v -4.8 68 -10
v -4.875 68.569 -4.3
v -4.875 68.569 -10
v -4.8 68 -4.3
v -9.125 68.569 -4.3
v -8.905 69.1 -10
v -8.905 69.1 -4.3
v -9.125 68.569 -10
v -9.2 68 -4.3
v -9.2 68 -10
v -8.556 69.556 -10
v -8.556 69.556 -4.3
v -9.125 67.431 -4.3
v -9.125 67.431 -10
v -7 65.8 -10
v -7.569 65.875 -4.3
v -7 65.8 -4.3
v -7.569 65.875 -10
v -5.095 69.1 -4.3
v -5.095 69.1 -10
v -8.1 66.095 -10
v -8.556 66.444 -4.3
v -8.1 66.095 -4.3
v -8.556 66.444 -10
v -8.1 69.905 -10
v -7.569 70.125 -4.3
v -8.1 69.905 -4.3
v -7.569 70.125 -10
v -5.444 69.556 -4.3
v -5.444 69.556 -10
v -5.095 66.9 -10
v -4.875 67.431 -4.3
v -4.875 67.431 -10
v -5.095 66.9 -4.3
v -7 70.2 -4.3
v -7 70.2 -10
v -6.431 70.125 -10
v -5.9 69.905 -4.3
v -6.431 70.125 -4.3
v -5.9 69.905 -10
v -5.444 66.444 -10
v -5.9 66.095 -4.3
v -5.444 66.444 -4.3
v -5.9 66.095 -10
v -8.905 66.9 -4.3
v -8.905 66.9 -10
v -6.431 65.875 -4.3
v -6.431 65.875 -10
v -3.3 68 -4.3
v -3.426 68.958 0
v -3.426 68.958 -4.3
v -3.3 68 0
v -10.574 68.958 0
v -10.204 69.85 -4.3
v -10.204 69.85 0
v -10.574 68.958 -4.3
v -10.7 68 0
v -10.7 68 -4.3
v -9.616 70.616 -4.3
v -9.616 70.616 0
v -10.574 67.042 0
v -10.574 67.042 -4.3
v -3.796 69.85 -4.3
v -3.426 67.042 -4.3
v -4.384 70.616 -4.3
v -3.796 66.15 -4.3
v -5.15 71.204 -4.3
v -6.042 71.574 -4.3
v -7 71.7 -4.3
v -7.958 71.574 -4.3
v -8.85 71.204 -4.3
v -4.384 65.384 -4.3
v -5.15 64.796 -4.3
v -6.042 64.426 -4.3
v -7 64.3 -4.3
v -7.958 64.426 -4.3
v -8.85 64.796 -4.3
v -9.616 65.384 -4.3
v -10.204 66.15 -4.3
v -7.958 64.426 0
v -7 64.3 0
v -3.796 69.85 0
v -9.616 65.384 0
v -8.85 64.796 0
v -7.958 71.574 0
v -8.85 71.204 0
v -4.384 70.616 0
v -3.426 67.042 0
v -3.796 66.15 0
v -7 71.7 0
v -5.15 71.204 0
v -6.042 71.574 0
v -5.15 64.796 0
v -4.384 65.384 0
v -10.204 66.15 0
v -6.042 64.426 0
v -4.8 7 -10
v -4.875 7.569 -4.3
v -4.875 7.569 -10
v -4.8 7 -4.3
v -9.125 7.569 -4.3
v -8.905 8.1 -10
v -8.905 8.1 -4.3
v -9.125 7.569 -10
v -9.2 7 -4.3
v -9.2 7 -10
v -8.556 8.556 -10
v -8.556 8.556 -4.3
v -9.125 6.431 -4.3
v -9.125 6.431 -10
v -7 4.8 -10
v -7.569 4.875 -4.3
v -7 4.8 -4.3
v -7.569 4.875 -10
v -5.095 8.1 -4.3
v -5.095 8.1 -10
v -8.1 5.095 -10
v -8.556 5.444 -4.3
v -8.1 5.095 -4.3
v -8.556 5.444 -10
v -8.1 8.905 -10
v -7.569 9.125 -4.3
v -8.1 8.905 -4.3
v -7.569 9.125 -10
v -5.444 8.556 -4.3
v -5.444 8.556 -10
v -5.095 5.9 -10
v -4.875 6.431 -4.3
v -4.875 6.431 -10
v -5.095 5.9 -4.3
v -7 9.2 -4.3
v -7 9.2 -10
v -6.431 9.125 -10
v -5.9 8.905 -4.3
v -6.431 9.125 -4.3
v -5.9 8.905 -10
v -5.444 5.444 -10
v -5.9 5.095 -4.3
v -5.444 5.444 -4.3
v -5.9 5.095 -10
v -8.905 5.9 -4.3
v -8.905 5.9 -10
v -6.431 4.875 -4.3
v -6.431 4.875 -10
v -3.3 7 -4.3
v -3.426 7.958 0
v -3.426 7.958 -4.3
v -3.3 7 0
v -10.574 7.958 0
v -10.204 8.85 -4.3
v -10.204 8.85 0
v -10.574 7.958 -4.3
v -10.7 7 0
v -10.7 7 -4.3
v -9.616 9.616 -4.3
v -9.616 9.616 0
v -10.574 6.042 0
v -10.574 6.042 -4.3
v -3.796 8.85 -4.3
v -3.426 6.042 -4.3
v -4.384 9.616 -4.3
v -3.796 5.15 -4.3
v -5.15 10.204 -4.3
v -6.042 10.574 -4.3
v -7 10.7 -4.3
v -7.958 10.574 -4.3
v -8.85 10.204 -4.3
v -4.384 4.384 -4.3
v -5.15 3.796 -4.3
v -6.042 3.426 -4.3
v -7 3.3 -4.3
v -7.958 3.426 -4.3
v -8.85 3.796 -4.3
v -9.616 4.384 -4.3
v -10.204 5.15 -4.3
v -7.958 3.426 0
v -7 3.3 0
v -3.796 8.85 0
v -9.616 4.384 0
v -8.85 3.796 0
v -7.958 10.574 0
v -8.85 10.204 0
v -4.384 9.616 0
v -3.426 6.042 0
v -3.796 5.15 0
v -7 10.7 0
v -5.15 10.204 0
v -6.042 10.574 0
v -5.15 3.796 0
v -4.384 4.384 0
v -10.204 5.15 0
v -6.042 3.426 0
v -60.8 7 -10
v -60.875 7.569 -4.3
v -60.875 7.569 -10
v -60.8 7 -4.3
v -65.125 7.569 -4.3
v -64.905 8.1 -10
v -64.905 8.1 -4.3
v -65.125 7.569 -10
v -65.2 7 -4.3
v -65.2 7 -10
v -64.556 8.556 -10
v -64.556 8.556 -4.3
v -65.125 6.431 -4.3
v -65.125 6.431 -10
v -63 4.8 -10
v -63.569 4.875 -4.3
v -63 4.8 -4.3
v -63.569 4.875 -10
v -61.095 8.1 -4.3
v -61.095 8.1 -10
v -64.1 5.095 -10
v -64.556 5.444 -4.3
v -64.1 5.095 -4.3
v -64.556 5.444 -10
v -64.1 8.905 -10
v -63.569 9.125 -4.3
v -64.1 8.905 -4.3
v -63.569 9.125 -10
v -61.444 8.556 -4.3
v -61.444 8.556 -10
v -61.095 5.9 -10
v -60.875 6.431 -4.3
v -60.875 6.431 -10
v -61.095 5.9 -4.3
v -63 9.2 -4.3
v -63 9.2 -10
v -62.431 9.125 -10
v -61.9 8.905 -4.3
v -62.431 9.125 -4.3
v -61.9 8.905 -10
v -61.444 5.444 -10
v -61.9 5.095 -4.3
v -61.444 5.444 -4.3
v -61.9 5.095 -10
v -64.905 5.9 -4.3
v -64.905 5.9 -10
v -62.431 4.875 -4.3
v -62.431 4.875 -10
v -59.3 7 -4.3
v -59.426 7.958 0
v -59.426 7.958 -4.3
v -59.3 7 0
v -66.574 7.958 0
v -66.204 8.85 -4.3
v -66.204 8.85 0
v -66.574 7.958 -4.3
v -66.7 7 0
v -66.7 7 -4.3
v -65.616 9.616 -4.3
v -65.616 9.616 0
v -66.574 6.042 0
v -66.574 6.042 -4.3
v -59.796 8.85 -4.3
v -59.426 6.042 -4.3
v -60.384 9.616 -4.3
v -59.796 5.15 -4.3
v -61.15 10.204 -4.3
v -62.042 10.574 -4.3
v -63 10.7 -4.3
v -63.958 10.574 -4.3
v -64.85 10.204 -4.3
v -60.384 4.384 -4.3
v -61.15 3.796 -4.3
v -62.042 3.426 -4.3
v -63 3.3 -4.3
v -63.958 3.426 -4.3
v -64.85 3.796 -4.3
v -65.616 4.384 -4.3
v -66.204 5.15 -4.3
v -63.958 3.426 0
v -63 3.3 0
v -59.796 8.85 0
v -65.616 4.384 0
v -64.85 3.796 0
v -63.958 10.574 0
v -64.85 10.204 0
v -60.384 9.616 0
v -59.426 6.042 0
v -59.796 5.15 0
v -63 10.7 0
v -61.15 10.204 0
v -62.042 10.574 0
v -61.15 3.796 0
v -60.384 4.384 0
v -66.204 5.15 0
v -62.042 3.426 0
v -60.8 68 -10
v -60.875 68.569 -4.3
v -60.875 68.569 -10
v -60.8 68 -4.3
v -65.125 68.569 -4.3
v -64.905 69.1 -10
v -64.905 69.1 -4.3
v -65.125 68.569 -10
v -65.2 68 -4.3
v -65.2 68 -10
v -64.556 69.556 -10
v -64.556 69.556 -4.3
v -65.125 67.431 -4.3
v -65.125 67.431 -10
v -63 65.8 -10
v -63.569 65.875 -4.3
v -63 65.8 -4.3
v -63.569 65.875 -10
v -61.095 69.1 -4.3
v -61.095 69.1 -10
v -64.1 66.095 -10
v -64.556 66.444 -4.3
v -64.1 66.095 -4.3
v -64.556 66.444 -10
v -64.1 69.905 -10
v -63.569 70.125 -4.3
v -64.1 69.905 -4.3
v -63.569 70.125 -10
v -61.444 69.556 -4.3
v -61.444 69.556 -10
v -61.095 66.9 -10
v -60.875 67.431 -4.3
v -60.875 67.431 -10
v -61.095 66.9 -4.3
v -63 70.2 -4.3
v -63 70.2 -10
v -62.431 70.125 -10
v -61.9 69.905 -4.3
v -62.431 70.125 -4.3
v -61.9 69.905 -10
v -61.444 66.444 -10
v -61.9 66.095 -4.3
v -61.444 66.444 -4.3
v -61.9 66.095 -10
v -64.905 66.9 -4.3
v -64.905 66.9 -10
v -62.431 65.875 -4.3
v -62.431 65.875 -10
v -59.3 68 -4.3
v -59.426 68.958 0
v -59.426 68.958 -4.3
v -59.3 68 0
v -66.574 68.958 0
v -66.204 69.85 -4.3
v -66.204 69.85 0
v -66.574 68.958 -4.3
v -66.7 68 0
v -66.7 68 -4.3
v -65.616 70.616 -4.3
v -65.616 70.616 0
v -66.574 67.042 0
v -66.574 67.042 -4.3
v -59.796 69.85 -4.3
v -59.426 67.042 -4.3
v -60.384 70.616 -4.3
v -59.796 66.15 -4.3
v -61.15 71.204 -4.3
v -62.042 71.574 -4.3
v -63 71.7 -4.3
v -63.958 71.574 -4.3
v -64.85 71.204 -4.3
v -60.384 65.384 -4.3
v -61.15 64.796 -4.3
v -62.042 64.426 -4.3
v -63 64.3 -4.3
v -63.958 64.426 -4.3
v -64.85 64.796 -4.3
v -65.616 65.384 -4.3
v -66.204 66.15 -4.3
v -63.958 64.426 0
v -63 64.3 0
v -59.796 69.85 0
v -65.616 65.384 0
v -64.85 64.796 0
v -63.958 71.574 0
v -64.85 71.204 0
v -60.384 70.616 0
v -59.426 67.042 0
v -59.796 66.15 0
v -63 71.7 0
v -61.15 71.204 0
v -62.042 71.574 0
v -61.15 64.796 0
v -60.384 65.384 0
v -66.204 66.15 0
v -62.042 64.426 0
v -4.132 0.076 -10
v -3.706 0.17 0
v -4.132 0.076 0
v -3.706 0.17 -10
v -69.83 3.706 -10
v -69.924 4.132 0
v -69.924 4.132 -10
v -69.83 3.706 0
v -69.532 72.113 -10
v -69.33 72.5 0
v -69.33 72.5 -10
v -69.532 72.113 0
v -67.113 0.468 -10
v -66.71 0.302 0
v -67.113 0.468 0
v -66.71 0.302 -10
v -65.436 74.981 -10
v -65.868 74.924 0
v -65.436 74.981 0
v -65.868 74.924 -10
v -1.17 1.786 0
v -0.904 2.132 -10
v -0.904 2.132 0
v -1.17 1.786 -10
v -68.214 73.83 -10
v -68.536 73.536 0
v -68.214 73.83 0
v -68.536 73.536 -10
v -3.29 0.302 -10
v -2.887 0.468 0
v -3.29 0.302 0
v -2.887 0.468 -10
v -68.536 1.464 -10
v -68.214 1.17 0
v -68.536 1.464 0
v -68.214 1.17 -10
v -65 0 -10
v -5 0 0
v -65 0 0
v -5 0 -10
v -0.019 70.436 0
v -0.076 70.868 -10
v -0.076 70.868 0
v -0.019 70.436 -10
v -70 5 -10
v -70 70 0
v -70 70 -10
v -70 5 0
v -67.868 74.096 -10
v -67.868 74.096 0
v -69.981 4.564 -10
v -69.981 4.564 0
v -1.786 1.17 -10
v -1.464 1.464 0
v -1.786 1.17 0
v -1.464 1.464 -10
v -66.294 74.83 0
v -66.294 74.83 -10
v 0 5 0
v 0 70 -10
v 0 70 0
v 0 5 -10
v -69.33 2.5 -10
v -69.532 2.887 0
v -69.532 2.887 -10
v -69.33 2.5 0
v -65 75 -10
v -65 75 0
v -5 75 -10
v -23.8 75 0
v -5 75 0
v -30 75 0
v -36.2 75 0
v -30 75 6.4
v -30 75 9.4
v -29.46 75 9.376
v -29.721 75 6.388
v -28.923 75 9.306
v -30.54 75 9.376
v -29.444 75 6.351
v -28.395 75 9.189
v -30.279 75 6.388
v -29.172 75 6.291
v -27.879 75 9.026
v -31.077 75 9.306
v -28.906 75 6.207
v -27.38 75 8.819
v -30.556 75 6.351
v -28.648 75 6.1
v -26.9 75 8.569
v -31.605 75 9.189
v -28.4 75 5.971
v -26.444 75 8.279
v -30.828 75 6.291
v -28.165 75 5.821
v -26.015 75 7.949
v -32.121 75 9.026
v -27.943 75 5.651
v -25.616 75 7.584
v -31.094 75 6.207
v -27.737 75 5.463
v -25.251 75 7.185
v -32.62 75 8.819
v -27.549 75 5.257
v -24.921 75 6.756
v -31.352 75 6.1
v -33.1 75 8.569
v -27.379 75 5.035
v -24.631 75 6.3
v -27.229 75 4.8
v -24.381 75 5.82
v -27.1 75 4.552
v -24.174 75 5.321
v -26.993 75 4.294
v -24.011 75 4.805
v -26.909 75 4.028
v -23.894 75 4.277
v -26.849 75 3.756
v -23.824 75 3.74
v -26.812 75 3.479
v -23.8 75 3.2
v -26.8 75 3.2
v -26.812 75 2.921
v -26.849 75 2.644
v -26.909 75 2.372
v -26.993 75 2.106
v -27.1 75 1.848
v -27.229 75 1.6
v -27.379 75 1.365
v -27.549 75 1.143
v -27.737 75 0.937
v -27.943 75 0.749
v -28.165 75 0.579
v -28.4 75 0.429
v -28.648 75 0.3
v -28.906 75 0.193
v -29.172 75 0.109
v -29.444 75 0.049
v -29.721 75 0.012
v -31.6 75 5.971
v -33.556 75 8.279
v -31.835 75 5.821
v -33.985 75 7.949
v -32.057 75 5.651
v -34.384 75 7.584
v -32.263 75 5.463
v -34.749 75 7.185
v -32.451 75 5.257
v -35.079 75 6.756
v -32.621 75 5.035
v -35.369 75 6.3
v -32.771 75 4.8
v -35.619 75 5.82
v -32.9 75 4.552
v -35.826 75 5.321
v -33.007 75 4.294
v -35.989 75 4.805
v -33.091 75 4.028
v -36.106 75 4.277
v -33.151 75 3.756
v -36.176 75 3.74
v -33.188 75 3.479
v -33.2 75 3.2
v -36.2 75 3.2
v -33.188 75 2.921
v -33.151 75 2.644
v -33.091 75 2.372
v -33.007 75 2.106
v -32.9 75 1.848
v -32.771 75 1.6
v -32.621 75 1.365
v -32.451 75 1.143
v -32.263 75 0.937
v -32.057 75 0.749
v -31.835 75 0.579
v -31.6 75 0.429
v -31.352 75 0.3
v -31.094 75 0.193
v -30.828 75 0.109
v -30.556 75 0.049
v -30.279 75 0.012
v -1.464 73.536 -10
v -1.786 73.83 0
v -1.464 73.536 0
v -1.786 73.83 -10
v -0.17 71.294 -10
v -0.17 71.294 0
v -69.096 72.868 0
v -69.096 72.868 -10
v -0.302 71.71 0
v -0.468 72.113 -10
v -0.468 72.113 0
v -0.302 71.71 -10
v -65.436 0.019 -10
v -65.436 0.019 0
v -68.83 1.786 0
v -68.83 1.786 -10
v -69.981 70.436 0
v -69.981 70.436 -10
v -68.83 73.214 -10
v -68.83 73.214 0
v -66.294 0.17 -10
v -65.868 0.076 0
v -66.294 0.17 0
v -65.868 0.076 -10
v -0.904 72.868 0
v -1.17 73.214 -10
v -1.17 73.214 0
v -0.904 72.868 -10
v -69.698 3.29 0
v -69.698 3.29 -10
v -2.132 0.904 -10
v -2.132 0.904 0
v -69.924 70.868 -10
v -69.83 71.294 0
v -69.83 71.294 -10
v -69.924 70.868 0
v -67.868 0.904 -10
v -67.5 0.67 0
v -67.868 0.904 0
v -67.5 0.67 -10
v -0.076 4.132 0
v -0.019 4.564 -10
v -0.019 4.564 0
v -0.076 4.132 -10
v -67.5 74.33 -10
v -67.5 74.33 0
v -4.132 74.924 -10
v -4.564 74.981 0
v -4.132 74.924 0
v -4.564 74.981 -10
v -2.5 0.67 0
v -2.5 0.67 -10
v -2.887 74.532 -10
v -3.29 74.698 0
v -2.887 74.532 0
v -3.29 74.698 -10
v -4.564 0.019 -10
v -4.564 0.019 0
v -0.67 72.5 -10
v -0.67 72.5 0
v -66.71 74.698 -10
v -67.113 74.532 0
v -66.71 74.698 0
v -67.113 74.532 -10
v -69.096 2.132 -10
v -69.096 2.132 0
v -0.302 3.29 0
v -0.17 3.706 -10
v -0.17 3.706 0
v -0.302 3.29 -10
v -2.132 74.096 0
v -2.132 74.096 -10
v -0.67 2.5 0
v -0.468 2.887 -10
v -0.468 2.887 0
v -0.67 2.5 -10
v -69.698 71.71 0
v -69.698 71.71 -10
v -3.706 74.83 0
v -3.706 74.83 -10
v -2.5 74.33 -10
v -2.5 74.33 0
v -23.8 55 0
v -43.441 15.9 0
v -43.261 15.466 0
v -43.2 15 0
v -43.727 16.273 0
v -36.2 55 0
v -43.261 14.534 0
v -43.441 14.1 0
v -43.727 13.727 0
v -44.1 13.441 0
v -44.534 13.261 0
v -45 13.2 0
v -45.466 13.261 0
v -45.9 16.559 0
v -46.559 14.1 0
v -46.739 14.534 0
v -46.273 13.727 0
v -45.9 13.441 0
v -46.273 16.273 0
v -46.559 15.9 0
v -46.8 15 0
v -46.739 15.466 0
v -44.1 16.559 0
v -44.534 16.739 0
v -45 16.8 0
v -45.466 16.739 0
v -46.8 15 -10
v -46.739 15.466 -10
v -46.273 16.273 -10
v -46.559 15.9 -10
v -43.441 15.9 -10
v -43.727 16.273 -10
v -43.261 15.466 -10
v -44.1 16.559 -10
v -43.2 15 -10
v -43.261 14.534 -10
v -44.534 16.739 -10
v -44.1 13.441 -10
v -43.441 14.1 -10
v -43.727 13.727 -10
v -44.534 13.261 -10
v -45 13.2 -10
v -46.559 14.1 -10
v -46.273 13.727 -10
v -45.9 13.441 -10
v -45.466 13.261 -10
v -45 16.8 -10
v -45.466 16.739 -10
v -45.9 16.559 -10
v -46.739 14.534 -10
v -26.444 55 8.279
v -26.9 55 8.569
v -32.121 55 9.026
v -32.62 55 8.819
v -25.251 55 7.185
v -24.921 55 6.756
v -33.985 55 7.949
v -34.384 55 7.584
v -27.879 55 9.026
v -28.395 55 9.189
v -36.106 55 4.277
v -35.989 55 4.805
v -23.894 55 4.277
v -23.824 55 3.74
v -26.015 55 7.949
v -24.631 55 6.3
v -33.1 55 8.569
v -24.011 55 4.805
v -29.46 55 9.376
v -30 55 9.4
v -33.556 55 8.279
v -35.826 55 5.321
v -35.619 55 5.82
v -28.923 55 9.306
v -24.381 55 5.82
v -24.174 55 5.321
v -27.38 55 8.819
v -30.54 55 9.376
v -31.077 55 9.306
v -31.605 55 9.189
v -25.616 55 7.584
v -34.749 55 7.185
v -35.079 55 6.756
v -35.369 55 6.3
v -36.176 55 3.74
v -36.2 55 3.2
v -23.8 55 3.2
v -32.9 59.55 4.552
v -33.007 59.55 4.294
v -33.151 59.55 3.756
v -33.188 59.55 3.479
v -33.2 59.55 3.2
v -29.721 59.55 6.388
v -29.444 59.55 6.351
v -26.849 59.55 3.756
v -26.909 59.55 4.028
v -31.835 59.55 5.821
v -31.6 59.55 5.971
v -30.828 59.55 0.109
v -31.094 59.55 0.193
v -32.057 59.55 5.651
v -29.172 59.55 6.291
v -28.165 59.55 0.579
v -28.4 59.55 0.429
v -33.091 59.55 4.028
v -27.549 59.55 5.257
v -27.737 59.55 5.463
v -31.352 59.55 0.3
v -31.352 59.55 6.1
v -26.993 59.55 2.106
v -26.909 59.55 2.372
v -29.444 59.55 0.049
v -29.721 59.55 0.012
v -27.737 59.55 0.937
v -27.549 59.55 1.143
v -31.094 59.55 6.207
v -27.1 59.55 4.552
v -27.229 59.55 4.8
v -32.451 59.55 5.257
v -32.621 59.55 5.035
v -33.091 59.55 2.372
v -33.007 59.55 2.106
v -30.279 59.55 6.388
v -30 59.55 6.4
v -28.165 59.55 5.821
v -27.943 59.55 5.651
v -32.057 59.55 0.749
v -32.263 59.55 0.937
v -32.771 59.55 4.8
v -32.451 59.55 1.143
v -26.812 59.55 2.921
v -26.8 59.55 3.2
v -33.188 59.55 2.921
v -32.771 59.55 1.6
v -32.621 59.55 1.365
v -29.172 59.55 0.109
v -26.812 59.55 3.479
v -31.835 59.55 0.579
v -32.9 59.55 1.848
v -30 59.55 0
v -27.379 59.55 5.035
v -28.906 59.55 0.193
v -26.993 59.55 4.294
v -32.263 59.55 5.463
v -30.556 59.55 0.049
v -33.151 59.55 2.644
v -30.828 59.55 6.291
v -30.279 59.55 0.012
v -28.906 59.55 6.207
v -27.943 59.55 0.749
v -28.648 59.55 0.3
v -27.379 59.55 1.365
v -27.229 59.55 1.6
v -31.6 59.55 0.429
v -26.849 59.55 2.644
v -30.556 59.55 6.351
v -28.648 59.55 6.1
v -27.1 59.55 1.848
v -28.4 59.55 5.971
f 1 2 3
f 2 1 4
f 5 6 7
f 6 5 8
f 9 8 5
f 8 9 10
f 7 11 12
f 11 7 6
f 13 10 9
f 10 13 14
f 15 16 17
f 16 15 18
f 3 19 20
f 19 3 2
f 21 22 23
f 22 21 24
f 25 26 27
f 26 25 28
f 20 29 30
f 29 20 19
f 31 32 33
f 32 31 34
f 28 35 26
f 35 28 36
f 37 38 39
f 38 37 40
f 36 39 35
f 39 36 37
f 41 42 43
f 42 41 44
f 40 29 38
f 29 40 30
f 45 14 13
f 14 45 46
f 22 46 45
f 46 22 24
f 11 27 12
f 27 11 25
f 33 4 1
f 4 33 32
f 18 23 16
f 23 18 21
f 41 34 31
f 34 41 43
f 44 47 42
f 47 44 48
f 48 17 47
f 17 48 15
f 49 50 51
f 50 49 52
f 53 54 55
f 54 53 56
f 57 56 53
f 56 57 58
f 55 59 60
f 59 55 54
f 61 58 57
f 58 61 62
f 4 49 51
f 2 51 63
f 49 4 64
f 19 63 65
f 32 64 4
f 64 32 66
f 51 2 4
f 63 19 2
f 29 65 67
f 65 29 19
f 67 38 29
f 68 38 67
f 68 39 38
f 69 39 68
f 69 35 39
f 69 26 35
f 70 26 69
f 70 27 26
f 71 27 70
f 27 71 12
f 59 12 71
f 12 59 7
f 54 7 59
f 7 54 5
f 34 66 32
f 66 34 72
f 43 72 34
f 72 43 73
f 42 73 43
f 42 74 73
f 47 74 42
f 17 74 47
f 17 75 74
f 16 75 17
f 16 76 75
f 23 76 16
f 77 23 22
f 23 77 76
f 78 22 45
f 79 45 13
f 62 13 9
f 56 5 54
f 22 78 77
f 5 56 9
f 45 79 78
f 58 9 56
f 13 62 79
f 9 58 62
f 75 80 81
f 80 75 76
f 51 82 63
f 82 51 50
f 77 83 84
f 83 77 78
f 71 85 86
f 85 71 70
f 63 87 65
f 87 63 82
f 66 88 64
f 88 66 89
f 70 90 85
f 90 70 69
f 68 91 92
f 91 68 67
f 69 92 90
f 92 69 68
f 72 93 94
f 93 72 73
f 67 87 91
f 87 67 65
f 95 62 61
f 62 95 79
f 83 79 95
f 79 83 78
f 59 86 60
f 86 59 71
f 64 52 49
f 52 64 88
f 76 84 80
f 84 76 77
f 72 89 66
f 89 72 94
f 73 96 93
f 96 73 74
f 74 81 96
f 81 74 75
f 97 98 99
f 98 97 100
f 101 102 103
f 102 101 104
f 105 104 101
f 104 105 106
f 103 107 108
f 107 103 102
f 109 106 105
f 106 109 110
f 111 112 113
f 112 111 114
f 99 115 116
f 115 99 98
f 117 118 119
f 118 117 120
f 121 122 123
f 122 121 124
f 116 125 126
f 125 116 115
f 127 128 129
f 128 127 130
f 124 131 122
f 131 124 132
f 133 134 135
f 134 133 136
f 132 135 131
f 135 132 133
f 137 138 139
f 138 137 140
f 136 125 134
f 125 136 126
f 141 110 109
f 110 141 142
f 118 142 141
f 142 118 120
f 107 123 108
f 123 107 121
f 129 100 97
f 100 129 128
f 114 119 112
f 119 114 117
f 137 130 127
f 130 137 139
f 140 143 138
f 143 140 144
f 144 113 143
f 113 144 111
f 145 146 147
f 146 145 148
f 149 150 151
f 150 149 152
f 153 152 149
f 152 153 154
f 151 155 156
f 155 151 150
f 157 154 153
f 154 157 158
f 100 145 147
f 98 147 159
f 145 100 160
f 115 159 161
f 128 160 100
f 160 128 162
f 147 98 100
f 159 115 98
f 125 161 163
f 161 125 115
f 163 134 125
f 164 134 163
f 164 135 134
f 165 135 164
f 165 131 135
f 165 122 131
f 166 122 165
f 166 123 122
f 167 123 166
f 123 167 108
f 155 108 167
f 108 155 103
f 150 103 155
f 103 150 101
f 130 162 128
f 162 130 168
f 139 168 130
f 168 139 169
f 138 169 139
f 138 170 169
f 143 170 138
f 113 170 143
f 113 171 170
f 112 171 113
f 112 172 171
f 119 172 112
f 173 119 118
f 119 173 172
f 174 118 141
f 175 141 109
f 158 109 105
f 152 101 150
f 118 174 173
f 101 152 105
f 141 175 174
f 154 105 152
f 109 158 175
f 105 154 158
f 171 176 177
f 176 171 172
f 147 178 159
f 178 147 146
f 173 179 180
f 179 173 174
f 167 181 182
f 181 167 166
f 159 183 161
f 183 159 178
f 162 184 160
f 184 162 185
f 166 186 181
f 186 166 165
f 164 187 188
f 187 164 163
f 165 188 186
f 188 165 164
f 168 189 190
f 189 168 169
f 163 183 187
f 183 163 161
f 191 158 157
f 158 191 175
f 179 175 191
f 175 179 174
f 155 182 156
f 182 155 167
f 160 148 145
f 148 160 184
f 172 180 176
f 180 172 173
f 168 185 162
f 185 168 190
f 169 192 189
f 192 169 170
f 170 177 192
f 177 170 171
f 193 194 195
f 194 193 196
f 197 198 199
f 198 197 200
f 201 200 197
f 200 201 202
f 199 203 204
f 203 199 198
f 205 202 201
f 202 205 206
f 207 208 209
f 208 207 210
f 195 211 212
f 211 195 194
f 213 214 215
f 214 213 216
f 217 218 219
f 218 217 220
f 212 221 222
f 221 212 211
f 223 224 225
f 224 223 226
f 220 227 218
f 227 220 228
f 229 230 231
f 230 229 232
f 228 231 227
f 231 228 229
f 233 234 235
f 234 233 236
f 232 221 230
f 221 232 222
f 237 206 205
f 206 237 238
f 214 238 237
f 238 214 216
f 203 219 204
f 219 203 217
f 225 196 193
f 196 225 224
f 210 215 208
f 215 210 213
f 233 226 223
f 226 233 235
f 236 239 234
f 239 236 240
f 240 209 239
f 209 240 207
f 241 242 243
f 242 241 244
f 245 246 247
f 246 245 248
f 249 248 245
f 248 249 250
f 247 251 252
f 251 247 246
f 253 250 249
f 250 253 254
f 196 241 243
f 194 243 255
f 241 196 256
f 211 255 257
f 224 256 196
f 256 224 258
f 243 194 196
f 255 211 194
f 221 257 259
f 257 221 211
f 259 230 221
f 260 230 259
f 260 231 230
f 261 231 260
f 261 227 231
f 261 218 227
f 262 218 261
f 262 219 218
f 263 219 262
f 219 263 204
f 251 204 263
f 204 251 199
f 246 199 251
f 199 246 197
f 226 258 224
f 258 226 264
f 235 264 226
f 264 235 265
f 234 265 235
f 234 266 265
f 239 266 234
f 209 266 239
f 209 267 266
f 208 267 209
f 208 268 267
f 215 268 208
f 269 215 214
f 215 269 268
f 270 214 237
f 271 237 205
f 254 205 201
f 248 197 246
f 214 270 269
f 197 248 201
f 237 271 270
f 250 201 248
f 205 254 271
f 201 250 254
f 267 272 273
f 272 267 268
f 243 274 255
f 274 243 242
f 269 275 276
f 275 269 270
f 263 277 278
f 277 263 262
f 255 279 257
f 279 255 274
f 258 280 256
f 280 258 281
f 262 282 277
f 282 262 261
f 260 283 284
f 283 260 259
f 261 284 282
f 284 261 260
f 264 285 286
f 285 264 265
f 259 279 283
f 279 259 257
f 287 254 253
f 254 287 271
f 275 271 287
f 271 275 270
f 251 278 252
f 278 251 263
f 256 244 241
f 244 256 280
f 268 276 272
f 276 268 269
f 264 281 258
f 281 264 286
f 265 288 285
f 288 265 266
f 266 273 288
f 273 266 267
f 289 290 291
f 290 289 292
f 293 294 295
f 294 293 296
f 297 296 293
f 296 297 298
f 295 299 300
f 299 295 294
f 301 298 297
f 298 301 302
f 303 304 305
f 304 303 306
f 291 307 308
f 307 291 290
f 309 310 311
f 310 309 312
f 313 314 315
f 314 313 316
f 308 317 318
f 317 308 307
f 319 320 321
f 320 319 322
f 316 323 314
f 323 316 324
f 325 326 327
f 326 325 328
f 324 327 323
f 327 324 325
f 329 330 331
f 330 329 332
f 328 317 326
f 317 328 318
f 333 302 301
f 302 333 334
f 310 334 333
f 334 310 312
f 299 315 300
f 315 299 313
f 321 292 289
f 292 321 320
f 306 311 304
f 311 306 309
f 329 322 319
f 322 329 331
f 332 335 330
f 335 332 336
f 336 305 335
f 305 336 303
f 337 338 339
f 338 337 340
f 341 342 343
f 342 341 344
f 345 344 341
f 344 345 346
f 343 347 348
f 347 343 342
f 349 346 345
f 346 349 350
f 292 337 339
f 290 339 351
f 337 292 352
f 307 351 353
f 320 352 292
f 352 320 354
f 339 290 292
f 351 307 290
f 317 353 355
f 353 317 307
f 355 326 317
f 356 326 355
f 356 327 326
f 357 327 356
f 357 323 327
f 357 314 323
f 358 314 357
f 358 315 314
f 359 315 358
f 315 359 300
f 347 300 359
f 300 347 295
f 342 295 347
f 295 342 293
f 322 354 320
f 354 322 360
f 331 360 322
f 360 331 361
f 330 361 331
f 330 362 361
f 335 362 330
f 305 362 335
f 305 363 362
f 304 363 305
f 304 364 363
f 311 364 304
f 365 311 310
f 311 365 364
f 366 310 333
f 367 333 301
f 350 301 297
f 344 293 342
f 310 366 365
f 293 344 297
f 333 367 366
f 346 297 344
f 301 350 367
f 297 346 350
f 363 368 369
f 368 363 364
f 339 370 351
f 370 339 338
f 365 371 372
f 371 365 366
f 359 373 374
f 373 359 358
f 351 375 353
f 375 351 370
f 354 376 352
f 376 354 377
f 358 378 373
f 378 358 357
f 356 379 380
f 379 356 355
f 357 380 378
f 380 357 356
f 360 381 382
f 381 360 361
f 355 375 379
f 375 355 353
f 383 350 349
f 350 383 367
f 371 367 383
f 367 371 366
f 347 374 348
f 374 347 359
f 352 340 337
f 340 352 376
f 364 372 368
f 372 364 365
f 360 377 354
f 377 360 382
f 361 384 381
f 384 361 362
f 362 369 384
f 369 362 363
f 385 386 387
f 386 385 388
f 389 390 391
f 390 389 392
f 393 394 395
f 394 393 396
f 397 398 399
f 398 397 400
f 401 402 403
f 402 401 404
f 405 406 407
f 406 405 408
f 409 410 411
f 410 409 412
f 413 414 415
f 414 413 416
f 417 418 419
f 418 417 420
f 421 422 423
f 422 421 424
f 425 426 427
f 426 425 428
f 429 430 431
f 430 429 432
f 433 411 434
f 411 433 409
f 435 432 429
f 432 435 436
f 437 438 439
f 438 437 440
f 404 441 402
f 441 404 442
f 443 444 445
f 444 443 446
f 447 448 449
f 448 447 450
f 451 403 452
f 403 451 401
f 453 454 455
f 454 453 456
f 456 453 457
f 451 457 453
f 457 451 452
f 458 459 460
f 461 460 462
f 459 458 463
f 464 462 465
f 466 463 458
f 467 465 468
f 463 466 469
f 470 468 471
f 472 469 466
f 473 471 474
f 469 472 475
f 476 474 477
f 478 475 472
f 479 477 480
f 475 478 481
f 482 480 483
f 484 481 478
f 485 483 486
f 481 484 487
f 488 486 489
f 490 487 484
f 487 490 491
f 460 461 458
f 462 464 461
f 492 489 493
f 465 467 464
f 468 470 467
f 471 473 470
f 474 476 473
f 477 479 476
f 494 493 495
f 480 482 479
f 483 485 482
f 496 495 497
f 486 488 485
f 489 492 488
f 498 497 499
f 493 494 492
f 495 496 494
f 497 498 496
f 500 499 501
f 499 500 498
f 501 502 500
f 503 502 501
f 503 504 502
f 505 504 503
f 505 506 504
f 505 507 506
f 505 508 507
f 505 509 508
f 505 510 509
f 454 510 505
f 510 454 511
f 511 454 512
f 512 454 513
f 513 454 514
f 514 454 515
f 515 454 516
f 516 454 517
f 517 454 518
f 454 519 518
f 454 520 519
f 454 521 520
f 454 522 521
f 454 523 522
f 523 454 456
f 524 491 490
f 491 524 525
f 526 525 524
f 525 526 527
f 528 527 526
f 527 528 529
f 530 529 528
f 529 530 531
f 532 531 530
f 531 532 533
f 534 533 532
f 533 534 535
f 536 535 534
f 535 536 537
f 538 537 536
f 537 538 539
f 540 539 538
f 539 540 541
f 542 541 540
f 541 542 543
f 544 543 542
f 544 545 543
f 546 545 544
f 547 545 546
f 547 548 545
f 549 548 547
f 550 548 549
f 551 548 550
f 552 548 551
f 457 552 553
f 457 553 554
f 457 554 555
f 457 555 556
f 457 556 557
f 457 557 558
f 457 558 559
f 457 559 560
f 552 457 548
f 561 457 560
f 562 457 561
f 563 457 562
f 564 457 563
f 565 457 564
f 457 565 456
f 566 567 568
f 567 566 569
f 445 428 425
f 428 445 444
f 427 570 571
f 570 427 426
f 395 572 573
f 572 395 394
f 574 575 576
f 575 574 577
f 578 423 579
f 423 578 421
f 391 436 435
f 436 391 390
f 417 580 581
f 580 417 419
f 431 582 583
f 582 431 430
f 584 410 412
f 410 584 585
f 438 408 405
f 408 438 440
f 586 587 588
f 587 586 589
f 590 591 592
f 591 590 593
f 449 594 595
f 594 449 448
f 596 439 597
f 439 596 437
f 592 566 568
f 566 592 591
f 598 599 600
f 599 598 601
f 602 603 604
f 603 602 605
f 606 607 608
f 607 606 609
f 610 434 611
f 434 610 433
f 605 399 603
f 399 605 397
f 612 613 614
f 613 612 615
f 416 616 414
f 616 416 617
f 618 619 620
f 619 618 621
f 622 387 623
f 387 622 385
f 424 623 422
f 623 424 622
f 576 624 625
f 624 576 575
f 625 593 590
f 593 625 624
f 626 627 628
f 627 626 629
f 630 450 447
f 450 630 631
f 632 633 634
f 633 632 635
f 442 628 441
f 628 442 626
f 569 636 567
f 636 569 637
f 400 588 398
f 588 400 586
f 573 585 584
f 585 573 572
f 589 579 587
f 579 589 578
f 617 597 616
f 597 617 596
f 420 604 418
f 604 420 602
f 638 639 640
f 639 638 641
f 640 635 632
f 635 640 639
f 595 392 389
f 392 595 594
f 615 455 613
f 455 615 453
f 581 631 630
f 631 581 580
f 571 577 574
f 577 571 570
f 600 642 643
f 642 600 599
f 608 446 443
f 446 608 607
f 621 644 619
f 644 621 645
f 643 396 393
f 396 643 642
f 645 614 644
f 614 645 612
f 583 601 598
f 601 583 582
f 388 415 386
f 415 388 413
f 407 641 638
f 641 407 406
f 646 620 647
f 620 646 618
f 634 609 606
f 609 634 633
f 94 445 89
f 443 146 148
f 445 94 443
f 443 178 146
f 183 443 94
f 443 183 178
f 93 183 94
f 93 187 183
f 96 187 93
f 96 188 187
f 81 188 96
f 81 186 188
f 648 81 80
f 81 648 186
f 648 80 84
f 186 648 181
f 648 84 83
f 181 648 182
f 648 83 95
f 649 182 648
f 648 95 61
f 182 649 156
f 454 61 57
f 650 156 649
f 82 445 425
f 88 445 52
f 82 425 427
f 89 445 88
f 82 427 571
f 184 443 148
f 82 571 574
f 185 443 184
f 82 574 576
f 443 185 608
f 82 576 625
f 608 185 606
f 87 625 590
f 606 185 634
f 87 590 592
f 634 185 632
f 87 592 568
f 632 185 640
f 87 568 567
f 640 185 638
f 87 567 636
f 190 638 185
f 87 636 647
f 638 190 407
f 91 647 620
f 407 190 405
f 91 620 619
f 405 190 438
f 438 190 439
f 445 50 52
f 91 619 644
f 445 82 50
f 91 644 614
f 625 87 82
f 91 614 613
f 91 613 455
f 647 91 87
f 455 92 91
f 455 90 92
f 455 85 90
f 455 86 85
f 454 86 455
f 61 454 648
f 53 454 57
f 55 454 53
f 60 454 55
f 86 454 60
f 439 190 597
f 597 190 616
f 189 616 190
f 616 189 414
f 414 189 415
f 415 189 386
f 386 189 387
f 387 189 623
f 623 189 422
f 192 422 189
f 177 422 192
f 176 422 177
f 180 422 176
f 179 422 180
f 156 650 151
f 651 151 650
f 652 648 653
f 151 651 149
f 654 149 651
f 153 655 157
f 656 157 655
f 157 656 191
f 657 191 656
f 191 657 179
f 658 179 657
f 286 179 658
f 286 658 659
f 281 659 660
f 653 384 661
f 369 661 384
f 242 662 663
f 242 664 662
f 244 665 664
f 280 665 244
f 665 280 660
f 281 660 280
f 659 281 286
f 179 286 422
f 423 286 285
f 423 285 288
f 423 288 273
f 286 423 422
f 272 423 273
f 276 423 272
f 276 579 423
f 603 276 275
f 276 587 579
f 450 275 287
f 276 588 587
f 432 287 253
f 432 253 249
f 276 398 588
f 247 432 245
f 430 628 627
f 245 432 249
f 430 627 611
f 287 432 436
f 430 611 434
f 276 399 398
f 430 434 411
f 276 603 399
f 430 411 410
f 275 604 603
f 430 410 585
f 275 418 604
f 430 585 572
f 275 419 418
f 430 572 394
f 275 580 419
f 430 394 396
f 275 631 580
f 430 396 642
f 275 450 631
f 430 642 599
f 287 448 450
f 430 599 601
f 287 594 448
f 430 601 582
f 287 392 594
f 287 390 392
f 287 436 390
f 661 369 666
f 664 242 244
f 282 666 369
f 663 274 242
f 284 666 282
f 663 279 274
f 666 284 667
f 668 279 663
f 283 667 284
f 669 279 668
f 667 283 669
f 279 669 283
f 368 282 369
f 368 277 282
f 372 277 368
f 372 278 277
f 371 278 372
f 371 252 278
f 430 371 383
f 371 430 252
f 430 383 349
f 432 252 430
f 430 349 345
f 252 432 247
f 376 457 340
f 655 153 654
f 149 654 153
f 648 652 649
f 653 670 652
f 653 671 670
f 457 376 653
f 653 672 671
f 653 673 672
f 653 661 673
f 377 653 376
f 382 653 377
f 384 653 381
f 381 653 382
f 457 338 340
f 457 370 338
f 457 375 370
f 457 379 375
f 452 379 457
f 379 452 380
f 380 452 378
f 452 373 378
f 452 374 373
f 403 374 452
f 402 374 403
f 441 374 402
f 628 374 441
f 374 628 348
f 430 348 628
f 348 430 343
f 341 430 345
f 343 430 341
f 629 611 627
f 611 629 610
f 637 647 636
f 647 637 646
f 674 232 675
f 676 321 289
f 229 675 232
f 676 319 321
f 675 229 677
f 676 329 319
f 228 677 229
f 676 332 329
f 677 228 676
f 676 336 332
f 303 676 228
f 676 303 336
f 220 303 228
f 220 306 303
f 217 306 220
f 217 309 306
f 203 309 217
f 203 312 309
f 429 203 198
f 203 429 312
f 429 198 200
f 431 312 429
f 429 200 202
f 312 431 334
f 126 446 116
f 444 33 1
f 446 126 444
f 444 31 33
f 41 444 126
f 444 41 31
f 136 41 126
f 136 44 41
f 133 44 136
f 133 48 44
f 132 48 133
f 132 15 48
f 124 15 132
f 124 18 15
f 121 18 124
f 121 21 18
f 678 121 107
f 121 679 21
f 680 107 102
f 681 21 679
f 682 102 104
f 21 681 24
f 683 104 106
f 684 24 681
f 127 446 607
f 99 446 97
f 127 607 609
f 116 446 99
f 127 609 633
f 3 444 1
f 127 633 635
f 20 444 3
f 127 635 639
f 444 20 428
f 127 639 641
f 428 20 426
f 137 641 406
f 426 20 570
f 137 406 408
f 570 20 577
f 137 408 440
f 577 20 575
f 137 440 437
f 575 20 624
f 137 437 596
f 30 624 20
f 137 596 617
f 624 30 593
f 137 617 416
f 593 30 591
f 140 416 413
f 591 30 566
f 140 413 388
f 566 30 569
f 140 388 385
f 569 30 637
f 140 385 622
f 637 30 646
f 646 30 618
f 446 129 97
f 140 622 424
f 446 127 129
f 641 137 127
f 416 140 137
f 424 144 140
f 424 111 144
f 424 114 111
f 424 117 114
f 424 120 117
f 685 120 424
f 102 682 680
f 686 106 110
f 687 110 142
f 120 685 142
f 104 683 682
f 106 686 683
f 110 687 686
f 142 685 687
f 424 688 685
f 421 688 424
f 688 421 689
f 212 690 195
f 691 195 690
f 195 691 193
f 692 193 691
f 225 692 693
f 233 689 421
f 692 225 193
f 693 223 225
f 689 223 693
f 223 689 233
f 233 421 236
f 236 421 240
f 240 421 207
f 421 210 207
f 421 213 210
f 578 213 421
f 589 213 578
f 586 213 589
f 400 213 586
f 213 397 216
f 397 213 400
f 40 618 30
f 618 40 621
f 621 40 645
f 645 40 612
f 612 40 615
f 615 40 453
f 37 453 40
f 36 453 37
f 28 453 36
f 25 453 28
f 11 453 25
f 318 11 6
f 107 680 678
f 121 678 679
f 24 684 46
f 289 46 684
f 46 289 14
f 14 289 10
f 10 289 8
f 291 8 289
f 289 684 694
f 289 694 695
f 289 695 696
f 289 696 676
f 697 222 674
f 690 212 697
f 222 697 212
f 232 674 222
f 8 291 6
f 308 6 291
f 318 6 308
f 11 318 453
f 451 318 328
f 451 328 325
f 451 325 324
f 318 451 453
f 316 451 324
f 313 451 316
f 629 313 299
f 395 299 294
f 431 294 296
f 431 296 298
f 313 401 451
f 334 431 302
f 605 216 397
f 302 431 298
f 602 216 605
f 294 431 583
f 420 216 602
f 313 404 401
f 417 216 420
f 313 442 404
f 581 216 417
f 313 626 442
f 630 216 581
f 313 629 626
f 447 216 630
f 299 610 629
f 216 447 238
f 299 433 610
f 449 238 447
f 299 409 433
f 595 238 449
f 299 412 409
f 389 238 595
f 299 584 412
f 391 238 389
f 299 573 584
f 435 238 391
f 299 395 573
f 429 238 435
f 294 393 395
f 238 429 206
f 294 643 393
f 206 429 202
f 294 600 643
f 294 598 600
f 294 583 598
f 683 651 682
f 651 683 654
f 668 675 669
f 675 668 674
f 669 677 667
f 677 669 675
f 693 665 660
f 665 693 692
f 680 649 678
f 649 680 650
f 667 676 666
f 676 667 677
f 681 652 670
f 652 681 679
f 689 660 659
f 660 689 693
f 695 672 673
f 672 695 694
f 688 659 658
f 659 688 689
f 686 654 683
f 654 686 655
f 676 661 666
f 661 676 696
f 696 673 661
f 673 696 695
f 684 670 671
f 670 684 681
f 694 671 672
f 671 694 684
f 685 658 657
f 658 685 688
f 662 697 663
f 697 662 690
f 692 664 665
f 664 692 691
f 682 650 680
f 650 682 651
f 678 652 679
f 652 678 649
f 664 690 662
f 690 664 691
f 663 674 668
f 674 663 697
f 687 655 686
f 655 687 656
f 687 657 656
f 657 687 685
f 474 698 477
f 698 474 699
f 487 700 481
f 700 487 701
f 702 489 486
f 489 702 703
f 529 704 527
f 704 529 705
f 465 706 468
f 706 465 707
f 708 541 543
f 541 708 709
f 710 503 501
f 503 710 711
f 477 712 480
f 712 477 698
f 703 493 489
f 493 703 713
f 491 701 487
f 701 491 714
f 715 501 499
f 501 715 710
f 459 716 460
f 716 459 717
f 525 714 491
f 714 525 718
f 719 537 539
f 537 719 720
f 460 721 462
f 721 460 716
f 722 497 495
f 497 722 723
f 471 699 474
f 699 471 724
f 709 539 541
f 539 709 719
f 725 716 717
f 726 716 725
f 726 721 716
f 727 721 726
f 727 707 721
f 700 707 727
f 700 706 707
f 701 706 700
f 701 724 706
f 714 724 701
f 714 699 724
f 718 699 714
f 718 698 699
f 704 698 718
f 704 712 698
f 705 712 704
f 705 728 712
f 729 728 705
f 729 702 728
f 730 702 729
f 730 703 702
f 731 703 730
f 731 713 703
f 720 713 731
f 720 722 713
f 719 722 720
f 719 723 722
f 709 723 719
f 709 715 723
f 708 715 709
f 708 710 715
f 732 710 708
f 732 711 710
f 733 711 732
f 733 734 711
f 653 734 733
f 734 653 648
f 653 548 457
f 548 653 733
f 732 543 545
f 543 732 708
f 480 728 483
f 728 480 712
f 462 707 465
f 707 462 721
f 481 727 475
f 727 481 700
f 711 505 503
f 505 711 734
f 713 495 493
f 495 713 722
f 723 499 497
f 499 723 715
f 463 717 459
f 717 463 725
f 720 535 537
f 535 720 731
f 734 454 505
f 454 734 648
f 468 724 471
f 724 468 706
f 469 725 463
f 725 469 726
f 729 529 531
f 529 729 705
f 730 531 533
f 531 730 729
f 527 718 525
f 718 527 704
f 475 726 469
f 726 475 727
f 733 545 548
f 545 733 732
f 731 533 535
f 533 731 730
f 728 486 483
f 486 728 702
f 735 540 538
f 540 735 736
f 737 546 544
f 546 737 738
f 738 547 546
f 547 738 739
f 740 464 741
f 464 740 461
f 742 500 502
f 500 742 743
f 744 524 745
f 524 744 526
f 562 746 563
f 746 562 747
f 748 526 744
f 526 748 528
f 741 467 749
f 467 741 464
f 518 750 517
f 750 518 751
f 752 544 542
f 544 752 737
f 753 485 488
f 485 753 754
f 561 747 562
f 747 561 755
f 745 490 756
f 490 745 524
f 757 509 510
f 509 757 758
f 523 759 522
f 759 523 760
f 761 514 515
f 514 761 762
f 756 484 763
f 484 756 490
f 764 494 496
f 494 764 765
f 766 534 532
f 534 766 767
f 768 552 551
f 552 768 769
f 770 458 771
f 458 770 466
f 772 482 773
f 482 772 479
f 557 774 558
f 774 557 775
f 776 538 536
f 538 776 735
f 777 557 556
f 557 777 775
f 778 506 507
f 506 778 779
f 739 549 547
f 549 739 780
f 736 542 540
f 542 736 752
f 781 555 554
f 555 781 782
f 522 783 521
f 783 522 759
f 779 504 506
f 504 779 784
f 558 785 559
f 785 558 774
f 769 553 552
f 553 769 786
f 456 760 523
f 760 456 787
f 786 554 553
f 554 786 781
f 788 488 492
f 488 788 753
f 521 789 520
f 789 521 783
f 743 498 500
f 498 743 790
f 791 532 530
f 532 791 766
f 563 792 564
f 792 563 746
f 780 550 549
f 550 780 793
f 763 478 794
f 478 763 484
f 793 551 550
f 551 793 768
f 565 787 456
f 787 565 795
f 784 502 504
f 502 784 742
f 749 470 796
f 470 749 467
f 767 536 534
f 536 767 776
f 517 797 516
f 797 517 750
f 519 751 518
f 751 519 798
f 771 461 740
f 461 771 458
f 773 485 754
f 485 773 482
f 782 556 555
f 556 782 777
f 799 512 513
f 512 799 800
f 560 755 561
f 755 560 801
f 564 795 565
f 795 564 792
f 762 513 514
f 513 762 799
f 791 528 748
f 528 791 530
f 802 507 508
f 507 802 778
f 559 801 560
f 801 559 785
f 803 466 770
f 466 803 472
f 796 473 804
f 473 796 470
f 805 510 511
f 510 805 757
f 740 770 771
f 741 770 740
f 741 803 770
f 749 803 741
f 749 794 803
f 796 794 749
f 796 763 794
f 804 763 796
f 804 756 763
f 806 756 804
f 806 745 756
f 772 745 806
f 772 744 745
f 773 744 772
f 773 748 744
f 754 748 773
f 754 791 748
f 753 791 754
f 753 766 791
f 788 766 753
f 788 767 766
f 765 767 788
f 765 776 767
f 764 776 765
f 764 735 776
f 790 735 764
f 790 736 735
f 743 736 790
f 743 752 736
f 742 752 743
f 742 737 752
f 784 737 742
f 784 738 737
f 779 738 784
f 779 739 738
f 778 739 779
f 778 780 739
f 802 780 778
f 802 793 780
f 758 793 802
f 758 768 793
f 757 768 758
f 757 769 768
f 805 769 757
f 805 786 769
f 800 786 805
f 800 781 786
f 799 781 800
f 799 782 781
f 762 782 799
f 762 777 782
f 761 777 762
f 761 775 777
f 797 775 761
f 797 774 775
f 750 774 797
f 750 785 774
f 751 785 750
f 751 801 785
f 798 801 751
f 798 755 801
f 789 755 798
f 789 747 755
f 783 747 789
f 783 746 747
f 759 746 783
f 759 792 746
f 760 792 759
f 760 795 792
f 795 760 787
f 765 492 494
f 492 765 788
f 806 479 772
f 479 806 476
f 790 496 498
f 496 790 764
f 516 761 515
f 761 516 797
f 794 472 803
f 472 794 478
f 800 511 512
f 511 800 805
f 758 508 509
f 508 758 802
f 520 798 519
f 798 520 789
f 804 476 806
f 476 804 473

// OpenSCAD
//Mallet dimentions
Mallet_d=74;
Mallet_h=56;
MalletHandle_d=32.5; //tapers to 35.5 at base
MalletHandleTop_r=16.25;

kTable_w=100;

//MotorBracket();
//mirror([1,0,0]) translate([kTable_w,0,0]) MotorBracket();
//translate([0,400,0]) mirror([0,1,0]) IdlePulleyBracket();
//translate([0,400,0]) mirror([0,1,0]) mirror([1,0,0]) translate([kTable_w,0,0]) IdlePulleyBracket();
//translate([0,150,0]) Carage();
//translate([0,150,0]) mirror([1,0,0]) translate([kTable_w,0,0]) Carage();


rSetScrew8=1.8; // #8-32 threaded hole
rScrew8Clear=2.2; // #8-32 clearance hole
rScrew8Head=3.7;
hScrew8Head=4.3;
$fn=72;

module BoltHole8(depth=12){
	translate([0,0,-depth+0.05])
		//thread(0.635,2.8,depth,30); // #4-40
		cylinder(r=rSetScrew8,h=depth,$fn=24);
} // BoltHole8

module BoltHeadHole8(inset=hScrew8Head,depth=12){

	translate([0,0,-depth+0.05])
		cylinder(r=rScrew8Clear,h=depth,$fn=24);
	translate([0,0,-inset]) cylinder(r=rScrew8Head,h=inset+0.1,$fn=24);
} // BoltHeadHole8
kBoltCircle23_d=66.8;

module Mema23Bolts(){

	for (J=[0:3])
		rotate([0,0,J*90+45]) translate([kBoltCircle23_d/2,0,0]) BoltHole8();

} // Mema23Bolts

//Mema23Bolts();

kRod_r=3.2;


kRodOffset_X=30;
kSidePulleyCL=45;
kPulley_d=70;
kPulley_h=16;

module Pulley(){
  cylinder(r=kPulley_d/2,h=kPulley_h);
} // Pulley

module MotorBracket(){
	kBracket_L=100;
	kBracket_H=50;
	kBracket_w=70;
	kBracket_r=5;
	kMBolt_r=3;
	kMotorBoss_r=19.1;

	// mounting plate
	difference(){
		translate([0,0,-kBracket_H]) cube([10,kBracket_L,kBracket_H]);

		// mounting holes
		translate([-0.05,kBracket_L/2-kBracket_L/4,-kBracket_H/2]) rotate([0,90,0])
			cylinder(r=kMBolt_r,h=20);
		translate([-0.05,kBracket_L/2+kBracket_L/4,-kBracket_H/2]) rotate([0,90,0])
			cylinder(r=kMBolt_r,h=20);

	} // diff

	// motor mount
	difference(){
		//translate([0,0,-10]) cube([kBracket_w,kBracket_L,10]);
		
		hull(){
			translate([0,0,-10]) cube([1,kBracket_L,10]);
			translate([kBracket_w-kBracket_r,kBracket_r,-10])
				cylinder(r=kBracket_r,h=10);
			translate([kBracket_w-kBracket_r,kBracket_L-kBracket_r,-10])
				cylinder(r=kBracket_r,h=10);

		} // hull

		translate([kSidePulleyCL,kBoltCircle23_d/2,0]){
			Mema23Bolts();
			translate([0,0,-11]) cylinder(r=kMotorBoss_r,h=12);}
	} // diff

	
	translate([kSidePulleyCL,kBoltCircle23_d/2,3]) color("Red") Pulley();

	// rod mount
	difference(){
		translate([kRodOffset_X,kBracket_L,kRod_r]) rotate([90,0,0])
			hull(){
				cylinder(r=10,h=30);
				translate([0,-kRod_r,0]) cylinder(r=10,h=30);
			} // hull

		translate([kRodOffset_X,kBracket_L+0.05,kRod_r]) rotate([90,0,0])
			cylinder(r=kRod_r,h=25.5);
	} // diff

} // MotorBracket


module IdlePulleyBracket(){
	kBracket_L=85;
	kBracket_H=50;
	kBracket_w=70;
	kBracket_r=5;
	kMBolt_r=3;
	kMotorBoss_r=12.72;
	kRod_r=3.2;

	// mounting plate
	difference(){
		translate([0,0,-kBracket_H]) cube([10,kBracket_L,kBracket_H]);

		// mounting holes
		translate([-0.05,kBracket_L/2-kBracket_L/4,-kBracket_H/2]) rotate([0,90,0])
			cylinder(r=kMBolt_r,h=20);
		translate([-0.05,kBracket_L/2+kBracket_L/4,-kBracket_H/2]) rotate([0,90,0])
			cylinder(r=kMBolt_r,h=20);

	} // diff

	// motor mount
	difference(){
		
		hull(){
			translate([0,0,-10]) cube([1,kBracket_L,10]);
			translate([kBracket_w-kBracket_r,kBracket_r,-10])
				cylinder(r=kBracket_r,h=10);
			translate([kBracket_w-kBracket_r,kBracket_L-kBracket_r,-10])
				cylinder(r=kBracket_r,h=10);

		} // hull

		translate([kSidePulleyCL,15,0])
			BoltHole8();
	} // diff

	translate([kSidePulleyCL,15,3]) color("Red") Pulley();

	// rod mount
	difference(){
		translate([kRodOffset_X,kBracket_L,kRod_r]) rotate([90,0,0])
			hull(){
				cylinder(r=10,h=30);
				translate([0,-kRod_r,0]) cylinder(r=10,h=30);
			} // hull

		translate([kRodOffset_X,kBracket_L+0.05,kRod_r]) rotate([90,0,0])
			cylinder(r=kRod_r,h=25.5);
	} // diff

} // IdlePulleyBracket

module IdlePulleyBracketS(){
	// Surface mount version of idle pulley bracket

	kBracket_L=75;
	kBracket_H=50;
	kBracket_w=70;
	kBracket_r=5;
	kMBolt_r=3;
	kMotorBoss_r=12.72;
	kRod_r=3.2;
	
	kMountBoltInset=kBracket_r+2;

	// motor mount
	difference(){
		
		hull(){
			//translate([0,0,-10]) cube([1,kBracket_L,10]);
			translate([kBracket_r,kBracket_L-kBracket_r,-10])
				cylinder(r=kBracket_r,h=10);
			translate([kBracket_r,kBracket_r,-10])
				cylinder(r=kBracket_r,h=10);
			translate([kBracket_w-kBracket_r,kBracket_r,-10])
				cylinder(r=kBracket_r,h=10);
			translate([kBracket_w-kBracket_r,kBracket_L-kBracket_r,-10])
				cylinder(r=kBracket_r,h=10);

		} // hull

		translate([kSidePulleyCL,15,0])
			BoltHole8();

	// mounting bolts
			translate([kMountBoltInset,kBracket_L-kMountBoltInset,0])
				BoltHeadHole8();
			translate([kMountBoltInset,kMountBoltInset,0])
				BoltHeadHole8();
			translate([kBracket_w-kMountBoltInset,kMountBoltInset,0])
				BoltHeadHole8();
			translate([kBracket_w-kMountBoltInset,kBracket_L-kMountBoltInset,0])
				BoltHeadHole8();
	} // diff

	

	
	// rod mount
	difference(){
		translate([kRodOffset_X,kBracket_L,kRod_r]) rotate([90,0,0])
			hull(){
				cylinder(r=kRod_r+3,h=20);
				translate([0,-kRod_r,0]) cylinder(r=kRod_r+3,h=20);
			} // hull

		translate([kRodOffset_X,kBracket_L+0.05,kRod_r]) rotate([90,0,0])
			cylinder(r=kRod_r,h=15.5);
	} // diff

} // IdlePulleyBracketS

//IdlePulleyBracketS();
mirror([1,0,0]) IdlePulleyBracketS();
//translate([kSidePulleyCL,15,3]) color("Red") Pulley();

module Carage(){
	kBracket_L=80;
	kBracket_H=50;
	kBracket_w=60;
	kBracket_r=5;
	kMBolt_r=3;
	kMotorBoss_r=12.72;
	kRod_r=3.2;
	kRodInset=30;

	kBushing_L=10;

	// motor mount
	difference(){
		
		hull(){
			translate([0,0,-10]) cube([1,kBracket_L,10]);
			translate([kBracket_w-kBracket_r,kBracket_r,-10])
				cylinder(r=kBracket_r,h=10);
			translate([kBracket_w-kBracket_r,kBracket_L-kBracket_r,-10])
				cylinder(r=kBracket_r,h=10);

		} // hull

		translate([10,10,0])
			BoltHole8();
		translate([10,kBracket_L-10,0])
			BoltHole8();
	} // diff


	// rod mount
	difference(){
		translate([kBracket_w/2+5,kBracket_L,kRod_r]) rotate([90,0,0])
			hull(){
				cylinder(r=10,h=kBushing_L);
				translate([0,-kRod_r,0]) cylinder(r=10,h=kBushing_L);
			} // hull

		translate([kBracket_w/2+5,kBracket_L+0.05,kRod_r]) rotate([90,0,0])
			cylinder(r=kRod_r,h=kBushing_L+0.1);
	} // diff

	// rod mount
	difference(){
		translate([kBracket_w/2+5,0,kRod_r]) rotate([-90,0,0])
			hull(){
				cylinder(r=10,h=kBushing_L);
				translate([0,kRod_r,0]) cylinder(r=10,h=kBushing_L);
			} // hull

		translate([kBracket_w/2+5,-0.05,kRod_r]) rotate([-90,0,0])
			cylinder(r=kRod_r,h=kBushing_L+0.1);
	} // diff

	// rod mount
	difference(){
		translate([0,kBracket_L-kRodInset,kRod_r]) rotate([0,90,0])
			hull(){
				cylinder(r=10,h=30);
				translate([kRod_r,0,0]) cylinder(r=10,h=30);
			} // hull

		translate([-0.05,kBracket_L-kRodInset,kRod_r]) rotate([0,90,0])
			cylinder(r=kRod_r,h=25.5);
	} // diff

	// rod mount
	difference(){
		translate([0,kRodInset,kRod_r]) rotate([0,90,0])
			hull(){
				cylinder(r=10,h=30);
				translate([kRod_r,0,0]) cylinder(r=10,h=30);
			} // hull

		translate([-0.05,kRodInset,kRod_r]) rotate([0,90,0])
			cylinder(r=kRod_r,h=25.5);
	} // diff

} // Carage
